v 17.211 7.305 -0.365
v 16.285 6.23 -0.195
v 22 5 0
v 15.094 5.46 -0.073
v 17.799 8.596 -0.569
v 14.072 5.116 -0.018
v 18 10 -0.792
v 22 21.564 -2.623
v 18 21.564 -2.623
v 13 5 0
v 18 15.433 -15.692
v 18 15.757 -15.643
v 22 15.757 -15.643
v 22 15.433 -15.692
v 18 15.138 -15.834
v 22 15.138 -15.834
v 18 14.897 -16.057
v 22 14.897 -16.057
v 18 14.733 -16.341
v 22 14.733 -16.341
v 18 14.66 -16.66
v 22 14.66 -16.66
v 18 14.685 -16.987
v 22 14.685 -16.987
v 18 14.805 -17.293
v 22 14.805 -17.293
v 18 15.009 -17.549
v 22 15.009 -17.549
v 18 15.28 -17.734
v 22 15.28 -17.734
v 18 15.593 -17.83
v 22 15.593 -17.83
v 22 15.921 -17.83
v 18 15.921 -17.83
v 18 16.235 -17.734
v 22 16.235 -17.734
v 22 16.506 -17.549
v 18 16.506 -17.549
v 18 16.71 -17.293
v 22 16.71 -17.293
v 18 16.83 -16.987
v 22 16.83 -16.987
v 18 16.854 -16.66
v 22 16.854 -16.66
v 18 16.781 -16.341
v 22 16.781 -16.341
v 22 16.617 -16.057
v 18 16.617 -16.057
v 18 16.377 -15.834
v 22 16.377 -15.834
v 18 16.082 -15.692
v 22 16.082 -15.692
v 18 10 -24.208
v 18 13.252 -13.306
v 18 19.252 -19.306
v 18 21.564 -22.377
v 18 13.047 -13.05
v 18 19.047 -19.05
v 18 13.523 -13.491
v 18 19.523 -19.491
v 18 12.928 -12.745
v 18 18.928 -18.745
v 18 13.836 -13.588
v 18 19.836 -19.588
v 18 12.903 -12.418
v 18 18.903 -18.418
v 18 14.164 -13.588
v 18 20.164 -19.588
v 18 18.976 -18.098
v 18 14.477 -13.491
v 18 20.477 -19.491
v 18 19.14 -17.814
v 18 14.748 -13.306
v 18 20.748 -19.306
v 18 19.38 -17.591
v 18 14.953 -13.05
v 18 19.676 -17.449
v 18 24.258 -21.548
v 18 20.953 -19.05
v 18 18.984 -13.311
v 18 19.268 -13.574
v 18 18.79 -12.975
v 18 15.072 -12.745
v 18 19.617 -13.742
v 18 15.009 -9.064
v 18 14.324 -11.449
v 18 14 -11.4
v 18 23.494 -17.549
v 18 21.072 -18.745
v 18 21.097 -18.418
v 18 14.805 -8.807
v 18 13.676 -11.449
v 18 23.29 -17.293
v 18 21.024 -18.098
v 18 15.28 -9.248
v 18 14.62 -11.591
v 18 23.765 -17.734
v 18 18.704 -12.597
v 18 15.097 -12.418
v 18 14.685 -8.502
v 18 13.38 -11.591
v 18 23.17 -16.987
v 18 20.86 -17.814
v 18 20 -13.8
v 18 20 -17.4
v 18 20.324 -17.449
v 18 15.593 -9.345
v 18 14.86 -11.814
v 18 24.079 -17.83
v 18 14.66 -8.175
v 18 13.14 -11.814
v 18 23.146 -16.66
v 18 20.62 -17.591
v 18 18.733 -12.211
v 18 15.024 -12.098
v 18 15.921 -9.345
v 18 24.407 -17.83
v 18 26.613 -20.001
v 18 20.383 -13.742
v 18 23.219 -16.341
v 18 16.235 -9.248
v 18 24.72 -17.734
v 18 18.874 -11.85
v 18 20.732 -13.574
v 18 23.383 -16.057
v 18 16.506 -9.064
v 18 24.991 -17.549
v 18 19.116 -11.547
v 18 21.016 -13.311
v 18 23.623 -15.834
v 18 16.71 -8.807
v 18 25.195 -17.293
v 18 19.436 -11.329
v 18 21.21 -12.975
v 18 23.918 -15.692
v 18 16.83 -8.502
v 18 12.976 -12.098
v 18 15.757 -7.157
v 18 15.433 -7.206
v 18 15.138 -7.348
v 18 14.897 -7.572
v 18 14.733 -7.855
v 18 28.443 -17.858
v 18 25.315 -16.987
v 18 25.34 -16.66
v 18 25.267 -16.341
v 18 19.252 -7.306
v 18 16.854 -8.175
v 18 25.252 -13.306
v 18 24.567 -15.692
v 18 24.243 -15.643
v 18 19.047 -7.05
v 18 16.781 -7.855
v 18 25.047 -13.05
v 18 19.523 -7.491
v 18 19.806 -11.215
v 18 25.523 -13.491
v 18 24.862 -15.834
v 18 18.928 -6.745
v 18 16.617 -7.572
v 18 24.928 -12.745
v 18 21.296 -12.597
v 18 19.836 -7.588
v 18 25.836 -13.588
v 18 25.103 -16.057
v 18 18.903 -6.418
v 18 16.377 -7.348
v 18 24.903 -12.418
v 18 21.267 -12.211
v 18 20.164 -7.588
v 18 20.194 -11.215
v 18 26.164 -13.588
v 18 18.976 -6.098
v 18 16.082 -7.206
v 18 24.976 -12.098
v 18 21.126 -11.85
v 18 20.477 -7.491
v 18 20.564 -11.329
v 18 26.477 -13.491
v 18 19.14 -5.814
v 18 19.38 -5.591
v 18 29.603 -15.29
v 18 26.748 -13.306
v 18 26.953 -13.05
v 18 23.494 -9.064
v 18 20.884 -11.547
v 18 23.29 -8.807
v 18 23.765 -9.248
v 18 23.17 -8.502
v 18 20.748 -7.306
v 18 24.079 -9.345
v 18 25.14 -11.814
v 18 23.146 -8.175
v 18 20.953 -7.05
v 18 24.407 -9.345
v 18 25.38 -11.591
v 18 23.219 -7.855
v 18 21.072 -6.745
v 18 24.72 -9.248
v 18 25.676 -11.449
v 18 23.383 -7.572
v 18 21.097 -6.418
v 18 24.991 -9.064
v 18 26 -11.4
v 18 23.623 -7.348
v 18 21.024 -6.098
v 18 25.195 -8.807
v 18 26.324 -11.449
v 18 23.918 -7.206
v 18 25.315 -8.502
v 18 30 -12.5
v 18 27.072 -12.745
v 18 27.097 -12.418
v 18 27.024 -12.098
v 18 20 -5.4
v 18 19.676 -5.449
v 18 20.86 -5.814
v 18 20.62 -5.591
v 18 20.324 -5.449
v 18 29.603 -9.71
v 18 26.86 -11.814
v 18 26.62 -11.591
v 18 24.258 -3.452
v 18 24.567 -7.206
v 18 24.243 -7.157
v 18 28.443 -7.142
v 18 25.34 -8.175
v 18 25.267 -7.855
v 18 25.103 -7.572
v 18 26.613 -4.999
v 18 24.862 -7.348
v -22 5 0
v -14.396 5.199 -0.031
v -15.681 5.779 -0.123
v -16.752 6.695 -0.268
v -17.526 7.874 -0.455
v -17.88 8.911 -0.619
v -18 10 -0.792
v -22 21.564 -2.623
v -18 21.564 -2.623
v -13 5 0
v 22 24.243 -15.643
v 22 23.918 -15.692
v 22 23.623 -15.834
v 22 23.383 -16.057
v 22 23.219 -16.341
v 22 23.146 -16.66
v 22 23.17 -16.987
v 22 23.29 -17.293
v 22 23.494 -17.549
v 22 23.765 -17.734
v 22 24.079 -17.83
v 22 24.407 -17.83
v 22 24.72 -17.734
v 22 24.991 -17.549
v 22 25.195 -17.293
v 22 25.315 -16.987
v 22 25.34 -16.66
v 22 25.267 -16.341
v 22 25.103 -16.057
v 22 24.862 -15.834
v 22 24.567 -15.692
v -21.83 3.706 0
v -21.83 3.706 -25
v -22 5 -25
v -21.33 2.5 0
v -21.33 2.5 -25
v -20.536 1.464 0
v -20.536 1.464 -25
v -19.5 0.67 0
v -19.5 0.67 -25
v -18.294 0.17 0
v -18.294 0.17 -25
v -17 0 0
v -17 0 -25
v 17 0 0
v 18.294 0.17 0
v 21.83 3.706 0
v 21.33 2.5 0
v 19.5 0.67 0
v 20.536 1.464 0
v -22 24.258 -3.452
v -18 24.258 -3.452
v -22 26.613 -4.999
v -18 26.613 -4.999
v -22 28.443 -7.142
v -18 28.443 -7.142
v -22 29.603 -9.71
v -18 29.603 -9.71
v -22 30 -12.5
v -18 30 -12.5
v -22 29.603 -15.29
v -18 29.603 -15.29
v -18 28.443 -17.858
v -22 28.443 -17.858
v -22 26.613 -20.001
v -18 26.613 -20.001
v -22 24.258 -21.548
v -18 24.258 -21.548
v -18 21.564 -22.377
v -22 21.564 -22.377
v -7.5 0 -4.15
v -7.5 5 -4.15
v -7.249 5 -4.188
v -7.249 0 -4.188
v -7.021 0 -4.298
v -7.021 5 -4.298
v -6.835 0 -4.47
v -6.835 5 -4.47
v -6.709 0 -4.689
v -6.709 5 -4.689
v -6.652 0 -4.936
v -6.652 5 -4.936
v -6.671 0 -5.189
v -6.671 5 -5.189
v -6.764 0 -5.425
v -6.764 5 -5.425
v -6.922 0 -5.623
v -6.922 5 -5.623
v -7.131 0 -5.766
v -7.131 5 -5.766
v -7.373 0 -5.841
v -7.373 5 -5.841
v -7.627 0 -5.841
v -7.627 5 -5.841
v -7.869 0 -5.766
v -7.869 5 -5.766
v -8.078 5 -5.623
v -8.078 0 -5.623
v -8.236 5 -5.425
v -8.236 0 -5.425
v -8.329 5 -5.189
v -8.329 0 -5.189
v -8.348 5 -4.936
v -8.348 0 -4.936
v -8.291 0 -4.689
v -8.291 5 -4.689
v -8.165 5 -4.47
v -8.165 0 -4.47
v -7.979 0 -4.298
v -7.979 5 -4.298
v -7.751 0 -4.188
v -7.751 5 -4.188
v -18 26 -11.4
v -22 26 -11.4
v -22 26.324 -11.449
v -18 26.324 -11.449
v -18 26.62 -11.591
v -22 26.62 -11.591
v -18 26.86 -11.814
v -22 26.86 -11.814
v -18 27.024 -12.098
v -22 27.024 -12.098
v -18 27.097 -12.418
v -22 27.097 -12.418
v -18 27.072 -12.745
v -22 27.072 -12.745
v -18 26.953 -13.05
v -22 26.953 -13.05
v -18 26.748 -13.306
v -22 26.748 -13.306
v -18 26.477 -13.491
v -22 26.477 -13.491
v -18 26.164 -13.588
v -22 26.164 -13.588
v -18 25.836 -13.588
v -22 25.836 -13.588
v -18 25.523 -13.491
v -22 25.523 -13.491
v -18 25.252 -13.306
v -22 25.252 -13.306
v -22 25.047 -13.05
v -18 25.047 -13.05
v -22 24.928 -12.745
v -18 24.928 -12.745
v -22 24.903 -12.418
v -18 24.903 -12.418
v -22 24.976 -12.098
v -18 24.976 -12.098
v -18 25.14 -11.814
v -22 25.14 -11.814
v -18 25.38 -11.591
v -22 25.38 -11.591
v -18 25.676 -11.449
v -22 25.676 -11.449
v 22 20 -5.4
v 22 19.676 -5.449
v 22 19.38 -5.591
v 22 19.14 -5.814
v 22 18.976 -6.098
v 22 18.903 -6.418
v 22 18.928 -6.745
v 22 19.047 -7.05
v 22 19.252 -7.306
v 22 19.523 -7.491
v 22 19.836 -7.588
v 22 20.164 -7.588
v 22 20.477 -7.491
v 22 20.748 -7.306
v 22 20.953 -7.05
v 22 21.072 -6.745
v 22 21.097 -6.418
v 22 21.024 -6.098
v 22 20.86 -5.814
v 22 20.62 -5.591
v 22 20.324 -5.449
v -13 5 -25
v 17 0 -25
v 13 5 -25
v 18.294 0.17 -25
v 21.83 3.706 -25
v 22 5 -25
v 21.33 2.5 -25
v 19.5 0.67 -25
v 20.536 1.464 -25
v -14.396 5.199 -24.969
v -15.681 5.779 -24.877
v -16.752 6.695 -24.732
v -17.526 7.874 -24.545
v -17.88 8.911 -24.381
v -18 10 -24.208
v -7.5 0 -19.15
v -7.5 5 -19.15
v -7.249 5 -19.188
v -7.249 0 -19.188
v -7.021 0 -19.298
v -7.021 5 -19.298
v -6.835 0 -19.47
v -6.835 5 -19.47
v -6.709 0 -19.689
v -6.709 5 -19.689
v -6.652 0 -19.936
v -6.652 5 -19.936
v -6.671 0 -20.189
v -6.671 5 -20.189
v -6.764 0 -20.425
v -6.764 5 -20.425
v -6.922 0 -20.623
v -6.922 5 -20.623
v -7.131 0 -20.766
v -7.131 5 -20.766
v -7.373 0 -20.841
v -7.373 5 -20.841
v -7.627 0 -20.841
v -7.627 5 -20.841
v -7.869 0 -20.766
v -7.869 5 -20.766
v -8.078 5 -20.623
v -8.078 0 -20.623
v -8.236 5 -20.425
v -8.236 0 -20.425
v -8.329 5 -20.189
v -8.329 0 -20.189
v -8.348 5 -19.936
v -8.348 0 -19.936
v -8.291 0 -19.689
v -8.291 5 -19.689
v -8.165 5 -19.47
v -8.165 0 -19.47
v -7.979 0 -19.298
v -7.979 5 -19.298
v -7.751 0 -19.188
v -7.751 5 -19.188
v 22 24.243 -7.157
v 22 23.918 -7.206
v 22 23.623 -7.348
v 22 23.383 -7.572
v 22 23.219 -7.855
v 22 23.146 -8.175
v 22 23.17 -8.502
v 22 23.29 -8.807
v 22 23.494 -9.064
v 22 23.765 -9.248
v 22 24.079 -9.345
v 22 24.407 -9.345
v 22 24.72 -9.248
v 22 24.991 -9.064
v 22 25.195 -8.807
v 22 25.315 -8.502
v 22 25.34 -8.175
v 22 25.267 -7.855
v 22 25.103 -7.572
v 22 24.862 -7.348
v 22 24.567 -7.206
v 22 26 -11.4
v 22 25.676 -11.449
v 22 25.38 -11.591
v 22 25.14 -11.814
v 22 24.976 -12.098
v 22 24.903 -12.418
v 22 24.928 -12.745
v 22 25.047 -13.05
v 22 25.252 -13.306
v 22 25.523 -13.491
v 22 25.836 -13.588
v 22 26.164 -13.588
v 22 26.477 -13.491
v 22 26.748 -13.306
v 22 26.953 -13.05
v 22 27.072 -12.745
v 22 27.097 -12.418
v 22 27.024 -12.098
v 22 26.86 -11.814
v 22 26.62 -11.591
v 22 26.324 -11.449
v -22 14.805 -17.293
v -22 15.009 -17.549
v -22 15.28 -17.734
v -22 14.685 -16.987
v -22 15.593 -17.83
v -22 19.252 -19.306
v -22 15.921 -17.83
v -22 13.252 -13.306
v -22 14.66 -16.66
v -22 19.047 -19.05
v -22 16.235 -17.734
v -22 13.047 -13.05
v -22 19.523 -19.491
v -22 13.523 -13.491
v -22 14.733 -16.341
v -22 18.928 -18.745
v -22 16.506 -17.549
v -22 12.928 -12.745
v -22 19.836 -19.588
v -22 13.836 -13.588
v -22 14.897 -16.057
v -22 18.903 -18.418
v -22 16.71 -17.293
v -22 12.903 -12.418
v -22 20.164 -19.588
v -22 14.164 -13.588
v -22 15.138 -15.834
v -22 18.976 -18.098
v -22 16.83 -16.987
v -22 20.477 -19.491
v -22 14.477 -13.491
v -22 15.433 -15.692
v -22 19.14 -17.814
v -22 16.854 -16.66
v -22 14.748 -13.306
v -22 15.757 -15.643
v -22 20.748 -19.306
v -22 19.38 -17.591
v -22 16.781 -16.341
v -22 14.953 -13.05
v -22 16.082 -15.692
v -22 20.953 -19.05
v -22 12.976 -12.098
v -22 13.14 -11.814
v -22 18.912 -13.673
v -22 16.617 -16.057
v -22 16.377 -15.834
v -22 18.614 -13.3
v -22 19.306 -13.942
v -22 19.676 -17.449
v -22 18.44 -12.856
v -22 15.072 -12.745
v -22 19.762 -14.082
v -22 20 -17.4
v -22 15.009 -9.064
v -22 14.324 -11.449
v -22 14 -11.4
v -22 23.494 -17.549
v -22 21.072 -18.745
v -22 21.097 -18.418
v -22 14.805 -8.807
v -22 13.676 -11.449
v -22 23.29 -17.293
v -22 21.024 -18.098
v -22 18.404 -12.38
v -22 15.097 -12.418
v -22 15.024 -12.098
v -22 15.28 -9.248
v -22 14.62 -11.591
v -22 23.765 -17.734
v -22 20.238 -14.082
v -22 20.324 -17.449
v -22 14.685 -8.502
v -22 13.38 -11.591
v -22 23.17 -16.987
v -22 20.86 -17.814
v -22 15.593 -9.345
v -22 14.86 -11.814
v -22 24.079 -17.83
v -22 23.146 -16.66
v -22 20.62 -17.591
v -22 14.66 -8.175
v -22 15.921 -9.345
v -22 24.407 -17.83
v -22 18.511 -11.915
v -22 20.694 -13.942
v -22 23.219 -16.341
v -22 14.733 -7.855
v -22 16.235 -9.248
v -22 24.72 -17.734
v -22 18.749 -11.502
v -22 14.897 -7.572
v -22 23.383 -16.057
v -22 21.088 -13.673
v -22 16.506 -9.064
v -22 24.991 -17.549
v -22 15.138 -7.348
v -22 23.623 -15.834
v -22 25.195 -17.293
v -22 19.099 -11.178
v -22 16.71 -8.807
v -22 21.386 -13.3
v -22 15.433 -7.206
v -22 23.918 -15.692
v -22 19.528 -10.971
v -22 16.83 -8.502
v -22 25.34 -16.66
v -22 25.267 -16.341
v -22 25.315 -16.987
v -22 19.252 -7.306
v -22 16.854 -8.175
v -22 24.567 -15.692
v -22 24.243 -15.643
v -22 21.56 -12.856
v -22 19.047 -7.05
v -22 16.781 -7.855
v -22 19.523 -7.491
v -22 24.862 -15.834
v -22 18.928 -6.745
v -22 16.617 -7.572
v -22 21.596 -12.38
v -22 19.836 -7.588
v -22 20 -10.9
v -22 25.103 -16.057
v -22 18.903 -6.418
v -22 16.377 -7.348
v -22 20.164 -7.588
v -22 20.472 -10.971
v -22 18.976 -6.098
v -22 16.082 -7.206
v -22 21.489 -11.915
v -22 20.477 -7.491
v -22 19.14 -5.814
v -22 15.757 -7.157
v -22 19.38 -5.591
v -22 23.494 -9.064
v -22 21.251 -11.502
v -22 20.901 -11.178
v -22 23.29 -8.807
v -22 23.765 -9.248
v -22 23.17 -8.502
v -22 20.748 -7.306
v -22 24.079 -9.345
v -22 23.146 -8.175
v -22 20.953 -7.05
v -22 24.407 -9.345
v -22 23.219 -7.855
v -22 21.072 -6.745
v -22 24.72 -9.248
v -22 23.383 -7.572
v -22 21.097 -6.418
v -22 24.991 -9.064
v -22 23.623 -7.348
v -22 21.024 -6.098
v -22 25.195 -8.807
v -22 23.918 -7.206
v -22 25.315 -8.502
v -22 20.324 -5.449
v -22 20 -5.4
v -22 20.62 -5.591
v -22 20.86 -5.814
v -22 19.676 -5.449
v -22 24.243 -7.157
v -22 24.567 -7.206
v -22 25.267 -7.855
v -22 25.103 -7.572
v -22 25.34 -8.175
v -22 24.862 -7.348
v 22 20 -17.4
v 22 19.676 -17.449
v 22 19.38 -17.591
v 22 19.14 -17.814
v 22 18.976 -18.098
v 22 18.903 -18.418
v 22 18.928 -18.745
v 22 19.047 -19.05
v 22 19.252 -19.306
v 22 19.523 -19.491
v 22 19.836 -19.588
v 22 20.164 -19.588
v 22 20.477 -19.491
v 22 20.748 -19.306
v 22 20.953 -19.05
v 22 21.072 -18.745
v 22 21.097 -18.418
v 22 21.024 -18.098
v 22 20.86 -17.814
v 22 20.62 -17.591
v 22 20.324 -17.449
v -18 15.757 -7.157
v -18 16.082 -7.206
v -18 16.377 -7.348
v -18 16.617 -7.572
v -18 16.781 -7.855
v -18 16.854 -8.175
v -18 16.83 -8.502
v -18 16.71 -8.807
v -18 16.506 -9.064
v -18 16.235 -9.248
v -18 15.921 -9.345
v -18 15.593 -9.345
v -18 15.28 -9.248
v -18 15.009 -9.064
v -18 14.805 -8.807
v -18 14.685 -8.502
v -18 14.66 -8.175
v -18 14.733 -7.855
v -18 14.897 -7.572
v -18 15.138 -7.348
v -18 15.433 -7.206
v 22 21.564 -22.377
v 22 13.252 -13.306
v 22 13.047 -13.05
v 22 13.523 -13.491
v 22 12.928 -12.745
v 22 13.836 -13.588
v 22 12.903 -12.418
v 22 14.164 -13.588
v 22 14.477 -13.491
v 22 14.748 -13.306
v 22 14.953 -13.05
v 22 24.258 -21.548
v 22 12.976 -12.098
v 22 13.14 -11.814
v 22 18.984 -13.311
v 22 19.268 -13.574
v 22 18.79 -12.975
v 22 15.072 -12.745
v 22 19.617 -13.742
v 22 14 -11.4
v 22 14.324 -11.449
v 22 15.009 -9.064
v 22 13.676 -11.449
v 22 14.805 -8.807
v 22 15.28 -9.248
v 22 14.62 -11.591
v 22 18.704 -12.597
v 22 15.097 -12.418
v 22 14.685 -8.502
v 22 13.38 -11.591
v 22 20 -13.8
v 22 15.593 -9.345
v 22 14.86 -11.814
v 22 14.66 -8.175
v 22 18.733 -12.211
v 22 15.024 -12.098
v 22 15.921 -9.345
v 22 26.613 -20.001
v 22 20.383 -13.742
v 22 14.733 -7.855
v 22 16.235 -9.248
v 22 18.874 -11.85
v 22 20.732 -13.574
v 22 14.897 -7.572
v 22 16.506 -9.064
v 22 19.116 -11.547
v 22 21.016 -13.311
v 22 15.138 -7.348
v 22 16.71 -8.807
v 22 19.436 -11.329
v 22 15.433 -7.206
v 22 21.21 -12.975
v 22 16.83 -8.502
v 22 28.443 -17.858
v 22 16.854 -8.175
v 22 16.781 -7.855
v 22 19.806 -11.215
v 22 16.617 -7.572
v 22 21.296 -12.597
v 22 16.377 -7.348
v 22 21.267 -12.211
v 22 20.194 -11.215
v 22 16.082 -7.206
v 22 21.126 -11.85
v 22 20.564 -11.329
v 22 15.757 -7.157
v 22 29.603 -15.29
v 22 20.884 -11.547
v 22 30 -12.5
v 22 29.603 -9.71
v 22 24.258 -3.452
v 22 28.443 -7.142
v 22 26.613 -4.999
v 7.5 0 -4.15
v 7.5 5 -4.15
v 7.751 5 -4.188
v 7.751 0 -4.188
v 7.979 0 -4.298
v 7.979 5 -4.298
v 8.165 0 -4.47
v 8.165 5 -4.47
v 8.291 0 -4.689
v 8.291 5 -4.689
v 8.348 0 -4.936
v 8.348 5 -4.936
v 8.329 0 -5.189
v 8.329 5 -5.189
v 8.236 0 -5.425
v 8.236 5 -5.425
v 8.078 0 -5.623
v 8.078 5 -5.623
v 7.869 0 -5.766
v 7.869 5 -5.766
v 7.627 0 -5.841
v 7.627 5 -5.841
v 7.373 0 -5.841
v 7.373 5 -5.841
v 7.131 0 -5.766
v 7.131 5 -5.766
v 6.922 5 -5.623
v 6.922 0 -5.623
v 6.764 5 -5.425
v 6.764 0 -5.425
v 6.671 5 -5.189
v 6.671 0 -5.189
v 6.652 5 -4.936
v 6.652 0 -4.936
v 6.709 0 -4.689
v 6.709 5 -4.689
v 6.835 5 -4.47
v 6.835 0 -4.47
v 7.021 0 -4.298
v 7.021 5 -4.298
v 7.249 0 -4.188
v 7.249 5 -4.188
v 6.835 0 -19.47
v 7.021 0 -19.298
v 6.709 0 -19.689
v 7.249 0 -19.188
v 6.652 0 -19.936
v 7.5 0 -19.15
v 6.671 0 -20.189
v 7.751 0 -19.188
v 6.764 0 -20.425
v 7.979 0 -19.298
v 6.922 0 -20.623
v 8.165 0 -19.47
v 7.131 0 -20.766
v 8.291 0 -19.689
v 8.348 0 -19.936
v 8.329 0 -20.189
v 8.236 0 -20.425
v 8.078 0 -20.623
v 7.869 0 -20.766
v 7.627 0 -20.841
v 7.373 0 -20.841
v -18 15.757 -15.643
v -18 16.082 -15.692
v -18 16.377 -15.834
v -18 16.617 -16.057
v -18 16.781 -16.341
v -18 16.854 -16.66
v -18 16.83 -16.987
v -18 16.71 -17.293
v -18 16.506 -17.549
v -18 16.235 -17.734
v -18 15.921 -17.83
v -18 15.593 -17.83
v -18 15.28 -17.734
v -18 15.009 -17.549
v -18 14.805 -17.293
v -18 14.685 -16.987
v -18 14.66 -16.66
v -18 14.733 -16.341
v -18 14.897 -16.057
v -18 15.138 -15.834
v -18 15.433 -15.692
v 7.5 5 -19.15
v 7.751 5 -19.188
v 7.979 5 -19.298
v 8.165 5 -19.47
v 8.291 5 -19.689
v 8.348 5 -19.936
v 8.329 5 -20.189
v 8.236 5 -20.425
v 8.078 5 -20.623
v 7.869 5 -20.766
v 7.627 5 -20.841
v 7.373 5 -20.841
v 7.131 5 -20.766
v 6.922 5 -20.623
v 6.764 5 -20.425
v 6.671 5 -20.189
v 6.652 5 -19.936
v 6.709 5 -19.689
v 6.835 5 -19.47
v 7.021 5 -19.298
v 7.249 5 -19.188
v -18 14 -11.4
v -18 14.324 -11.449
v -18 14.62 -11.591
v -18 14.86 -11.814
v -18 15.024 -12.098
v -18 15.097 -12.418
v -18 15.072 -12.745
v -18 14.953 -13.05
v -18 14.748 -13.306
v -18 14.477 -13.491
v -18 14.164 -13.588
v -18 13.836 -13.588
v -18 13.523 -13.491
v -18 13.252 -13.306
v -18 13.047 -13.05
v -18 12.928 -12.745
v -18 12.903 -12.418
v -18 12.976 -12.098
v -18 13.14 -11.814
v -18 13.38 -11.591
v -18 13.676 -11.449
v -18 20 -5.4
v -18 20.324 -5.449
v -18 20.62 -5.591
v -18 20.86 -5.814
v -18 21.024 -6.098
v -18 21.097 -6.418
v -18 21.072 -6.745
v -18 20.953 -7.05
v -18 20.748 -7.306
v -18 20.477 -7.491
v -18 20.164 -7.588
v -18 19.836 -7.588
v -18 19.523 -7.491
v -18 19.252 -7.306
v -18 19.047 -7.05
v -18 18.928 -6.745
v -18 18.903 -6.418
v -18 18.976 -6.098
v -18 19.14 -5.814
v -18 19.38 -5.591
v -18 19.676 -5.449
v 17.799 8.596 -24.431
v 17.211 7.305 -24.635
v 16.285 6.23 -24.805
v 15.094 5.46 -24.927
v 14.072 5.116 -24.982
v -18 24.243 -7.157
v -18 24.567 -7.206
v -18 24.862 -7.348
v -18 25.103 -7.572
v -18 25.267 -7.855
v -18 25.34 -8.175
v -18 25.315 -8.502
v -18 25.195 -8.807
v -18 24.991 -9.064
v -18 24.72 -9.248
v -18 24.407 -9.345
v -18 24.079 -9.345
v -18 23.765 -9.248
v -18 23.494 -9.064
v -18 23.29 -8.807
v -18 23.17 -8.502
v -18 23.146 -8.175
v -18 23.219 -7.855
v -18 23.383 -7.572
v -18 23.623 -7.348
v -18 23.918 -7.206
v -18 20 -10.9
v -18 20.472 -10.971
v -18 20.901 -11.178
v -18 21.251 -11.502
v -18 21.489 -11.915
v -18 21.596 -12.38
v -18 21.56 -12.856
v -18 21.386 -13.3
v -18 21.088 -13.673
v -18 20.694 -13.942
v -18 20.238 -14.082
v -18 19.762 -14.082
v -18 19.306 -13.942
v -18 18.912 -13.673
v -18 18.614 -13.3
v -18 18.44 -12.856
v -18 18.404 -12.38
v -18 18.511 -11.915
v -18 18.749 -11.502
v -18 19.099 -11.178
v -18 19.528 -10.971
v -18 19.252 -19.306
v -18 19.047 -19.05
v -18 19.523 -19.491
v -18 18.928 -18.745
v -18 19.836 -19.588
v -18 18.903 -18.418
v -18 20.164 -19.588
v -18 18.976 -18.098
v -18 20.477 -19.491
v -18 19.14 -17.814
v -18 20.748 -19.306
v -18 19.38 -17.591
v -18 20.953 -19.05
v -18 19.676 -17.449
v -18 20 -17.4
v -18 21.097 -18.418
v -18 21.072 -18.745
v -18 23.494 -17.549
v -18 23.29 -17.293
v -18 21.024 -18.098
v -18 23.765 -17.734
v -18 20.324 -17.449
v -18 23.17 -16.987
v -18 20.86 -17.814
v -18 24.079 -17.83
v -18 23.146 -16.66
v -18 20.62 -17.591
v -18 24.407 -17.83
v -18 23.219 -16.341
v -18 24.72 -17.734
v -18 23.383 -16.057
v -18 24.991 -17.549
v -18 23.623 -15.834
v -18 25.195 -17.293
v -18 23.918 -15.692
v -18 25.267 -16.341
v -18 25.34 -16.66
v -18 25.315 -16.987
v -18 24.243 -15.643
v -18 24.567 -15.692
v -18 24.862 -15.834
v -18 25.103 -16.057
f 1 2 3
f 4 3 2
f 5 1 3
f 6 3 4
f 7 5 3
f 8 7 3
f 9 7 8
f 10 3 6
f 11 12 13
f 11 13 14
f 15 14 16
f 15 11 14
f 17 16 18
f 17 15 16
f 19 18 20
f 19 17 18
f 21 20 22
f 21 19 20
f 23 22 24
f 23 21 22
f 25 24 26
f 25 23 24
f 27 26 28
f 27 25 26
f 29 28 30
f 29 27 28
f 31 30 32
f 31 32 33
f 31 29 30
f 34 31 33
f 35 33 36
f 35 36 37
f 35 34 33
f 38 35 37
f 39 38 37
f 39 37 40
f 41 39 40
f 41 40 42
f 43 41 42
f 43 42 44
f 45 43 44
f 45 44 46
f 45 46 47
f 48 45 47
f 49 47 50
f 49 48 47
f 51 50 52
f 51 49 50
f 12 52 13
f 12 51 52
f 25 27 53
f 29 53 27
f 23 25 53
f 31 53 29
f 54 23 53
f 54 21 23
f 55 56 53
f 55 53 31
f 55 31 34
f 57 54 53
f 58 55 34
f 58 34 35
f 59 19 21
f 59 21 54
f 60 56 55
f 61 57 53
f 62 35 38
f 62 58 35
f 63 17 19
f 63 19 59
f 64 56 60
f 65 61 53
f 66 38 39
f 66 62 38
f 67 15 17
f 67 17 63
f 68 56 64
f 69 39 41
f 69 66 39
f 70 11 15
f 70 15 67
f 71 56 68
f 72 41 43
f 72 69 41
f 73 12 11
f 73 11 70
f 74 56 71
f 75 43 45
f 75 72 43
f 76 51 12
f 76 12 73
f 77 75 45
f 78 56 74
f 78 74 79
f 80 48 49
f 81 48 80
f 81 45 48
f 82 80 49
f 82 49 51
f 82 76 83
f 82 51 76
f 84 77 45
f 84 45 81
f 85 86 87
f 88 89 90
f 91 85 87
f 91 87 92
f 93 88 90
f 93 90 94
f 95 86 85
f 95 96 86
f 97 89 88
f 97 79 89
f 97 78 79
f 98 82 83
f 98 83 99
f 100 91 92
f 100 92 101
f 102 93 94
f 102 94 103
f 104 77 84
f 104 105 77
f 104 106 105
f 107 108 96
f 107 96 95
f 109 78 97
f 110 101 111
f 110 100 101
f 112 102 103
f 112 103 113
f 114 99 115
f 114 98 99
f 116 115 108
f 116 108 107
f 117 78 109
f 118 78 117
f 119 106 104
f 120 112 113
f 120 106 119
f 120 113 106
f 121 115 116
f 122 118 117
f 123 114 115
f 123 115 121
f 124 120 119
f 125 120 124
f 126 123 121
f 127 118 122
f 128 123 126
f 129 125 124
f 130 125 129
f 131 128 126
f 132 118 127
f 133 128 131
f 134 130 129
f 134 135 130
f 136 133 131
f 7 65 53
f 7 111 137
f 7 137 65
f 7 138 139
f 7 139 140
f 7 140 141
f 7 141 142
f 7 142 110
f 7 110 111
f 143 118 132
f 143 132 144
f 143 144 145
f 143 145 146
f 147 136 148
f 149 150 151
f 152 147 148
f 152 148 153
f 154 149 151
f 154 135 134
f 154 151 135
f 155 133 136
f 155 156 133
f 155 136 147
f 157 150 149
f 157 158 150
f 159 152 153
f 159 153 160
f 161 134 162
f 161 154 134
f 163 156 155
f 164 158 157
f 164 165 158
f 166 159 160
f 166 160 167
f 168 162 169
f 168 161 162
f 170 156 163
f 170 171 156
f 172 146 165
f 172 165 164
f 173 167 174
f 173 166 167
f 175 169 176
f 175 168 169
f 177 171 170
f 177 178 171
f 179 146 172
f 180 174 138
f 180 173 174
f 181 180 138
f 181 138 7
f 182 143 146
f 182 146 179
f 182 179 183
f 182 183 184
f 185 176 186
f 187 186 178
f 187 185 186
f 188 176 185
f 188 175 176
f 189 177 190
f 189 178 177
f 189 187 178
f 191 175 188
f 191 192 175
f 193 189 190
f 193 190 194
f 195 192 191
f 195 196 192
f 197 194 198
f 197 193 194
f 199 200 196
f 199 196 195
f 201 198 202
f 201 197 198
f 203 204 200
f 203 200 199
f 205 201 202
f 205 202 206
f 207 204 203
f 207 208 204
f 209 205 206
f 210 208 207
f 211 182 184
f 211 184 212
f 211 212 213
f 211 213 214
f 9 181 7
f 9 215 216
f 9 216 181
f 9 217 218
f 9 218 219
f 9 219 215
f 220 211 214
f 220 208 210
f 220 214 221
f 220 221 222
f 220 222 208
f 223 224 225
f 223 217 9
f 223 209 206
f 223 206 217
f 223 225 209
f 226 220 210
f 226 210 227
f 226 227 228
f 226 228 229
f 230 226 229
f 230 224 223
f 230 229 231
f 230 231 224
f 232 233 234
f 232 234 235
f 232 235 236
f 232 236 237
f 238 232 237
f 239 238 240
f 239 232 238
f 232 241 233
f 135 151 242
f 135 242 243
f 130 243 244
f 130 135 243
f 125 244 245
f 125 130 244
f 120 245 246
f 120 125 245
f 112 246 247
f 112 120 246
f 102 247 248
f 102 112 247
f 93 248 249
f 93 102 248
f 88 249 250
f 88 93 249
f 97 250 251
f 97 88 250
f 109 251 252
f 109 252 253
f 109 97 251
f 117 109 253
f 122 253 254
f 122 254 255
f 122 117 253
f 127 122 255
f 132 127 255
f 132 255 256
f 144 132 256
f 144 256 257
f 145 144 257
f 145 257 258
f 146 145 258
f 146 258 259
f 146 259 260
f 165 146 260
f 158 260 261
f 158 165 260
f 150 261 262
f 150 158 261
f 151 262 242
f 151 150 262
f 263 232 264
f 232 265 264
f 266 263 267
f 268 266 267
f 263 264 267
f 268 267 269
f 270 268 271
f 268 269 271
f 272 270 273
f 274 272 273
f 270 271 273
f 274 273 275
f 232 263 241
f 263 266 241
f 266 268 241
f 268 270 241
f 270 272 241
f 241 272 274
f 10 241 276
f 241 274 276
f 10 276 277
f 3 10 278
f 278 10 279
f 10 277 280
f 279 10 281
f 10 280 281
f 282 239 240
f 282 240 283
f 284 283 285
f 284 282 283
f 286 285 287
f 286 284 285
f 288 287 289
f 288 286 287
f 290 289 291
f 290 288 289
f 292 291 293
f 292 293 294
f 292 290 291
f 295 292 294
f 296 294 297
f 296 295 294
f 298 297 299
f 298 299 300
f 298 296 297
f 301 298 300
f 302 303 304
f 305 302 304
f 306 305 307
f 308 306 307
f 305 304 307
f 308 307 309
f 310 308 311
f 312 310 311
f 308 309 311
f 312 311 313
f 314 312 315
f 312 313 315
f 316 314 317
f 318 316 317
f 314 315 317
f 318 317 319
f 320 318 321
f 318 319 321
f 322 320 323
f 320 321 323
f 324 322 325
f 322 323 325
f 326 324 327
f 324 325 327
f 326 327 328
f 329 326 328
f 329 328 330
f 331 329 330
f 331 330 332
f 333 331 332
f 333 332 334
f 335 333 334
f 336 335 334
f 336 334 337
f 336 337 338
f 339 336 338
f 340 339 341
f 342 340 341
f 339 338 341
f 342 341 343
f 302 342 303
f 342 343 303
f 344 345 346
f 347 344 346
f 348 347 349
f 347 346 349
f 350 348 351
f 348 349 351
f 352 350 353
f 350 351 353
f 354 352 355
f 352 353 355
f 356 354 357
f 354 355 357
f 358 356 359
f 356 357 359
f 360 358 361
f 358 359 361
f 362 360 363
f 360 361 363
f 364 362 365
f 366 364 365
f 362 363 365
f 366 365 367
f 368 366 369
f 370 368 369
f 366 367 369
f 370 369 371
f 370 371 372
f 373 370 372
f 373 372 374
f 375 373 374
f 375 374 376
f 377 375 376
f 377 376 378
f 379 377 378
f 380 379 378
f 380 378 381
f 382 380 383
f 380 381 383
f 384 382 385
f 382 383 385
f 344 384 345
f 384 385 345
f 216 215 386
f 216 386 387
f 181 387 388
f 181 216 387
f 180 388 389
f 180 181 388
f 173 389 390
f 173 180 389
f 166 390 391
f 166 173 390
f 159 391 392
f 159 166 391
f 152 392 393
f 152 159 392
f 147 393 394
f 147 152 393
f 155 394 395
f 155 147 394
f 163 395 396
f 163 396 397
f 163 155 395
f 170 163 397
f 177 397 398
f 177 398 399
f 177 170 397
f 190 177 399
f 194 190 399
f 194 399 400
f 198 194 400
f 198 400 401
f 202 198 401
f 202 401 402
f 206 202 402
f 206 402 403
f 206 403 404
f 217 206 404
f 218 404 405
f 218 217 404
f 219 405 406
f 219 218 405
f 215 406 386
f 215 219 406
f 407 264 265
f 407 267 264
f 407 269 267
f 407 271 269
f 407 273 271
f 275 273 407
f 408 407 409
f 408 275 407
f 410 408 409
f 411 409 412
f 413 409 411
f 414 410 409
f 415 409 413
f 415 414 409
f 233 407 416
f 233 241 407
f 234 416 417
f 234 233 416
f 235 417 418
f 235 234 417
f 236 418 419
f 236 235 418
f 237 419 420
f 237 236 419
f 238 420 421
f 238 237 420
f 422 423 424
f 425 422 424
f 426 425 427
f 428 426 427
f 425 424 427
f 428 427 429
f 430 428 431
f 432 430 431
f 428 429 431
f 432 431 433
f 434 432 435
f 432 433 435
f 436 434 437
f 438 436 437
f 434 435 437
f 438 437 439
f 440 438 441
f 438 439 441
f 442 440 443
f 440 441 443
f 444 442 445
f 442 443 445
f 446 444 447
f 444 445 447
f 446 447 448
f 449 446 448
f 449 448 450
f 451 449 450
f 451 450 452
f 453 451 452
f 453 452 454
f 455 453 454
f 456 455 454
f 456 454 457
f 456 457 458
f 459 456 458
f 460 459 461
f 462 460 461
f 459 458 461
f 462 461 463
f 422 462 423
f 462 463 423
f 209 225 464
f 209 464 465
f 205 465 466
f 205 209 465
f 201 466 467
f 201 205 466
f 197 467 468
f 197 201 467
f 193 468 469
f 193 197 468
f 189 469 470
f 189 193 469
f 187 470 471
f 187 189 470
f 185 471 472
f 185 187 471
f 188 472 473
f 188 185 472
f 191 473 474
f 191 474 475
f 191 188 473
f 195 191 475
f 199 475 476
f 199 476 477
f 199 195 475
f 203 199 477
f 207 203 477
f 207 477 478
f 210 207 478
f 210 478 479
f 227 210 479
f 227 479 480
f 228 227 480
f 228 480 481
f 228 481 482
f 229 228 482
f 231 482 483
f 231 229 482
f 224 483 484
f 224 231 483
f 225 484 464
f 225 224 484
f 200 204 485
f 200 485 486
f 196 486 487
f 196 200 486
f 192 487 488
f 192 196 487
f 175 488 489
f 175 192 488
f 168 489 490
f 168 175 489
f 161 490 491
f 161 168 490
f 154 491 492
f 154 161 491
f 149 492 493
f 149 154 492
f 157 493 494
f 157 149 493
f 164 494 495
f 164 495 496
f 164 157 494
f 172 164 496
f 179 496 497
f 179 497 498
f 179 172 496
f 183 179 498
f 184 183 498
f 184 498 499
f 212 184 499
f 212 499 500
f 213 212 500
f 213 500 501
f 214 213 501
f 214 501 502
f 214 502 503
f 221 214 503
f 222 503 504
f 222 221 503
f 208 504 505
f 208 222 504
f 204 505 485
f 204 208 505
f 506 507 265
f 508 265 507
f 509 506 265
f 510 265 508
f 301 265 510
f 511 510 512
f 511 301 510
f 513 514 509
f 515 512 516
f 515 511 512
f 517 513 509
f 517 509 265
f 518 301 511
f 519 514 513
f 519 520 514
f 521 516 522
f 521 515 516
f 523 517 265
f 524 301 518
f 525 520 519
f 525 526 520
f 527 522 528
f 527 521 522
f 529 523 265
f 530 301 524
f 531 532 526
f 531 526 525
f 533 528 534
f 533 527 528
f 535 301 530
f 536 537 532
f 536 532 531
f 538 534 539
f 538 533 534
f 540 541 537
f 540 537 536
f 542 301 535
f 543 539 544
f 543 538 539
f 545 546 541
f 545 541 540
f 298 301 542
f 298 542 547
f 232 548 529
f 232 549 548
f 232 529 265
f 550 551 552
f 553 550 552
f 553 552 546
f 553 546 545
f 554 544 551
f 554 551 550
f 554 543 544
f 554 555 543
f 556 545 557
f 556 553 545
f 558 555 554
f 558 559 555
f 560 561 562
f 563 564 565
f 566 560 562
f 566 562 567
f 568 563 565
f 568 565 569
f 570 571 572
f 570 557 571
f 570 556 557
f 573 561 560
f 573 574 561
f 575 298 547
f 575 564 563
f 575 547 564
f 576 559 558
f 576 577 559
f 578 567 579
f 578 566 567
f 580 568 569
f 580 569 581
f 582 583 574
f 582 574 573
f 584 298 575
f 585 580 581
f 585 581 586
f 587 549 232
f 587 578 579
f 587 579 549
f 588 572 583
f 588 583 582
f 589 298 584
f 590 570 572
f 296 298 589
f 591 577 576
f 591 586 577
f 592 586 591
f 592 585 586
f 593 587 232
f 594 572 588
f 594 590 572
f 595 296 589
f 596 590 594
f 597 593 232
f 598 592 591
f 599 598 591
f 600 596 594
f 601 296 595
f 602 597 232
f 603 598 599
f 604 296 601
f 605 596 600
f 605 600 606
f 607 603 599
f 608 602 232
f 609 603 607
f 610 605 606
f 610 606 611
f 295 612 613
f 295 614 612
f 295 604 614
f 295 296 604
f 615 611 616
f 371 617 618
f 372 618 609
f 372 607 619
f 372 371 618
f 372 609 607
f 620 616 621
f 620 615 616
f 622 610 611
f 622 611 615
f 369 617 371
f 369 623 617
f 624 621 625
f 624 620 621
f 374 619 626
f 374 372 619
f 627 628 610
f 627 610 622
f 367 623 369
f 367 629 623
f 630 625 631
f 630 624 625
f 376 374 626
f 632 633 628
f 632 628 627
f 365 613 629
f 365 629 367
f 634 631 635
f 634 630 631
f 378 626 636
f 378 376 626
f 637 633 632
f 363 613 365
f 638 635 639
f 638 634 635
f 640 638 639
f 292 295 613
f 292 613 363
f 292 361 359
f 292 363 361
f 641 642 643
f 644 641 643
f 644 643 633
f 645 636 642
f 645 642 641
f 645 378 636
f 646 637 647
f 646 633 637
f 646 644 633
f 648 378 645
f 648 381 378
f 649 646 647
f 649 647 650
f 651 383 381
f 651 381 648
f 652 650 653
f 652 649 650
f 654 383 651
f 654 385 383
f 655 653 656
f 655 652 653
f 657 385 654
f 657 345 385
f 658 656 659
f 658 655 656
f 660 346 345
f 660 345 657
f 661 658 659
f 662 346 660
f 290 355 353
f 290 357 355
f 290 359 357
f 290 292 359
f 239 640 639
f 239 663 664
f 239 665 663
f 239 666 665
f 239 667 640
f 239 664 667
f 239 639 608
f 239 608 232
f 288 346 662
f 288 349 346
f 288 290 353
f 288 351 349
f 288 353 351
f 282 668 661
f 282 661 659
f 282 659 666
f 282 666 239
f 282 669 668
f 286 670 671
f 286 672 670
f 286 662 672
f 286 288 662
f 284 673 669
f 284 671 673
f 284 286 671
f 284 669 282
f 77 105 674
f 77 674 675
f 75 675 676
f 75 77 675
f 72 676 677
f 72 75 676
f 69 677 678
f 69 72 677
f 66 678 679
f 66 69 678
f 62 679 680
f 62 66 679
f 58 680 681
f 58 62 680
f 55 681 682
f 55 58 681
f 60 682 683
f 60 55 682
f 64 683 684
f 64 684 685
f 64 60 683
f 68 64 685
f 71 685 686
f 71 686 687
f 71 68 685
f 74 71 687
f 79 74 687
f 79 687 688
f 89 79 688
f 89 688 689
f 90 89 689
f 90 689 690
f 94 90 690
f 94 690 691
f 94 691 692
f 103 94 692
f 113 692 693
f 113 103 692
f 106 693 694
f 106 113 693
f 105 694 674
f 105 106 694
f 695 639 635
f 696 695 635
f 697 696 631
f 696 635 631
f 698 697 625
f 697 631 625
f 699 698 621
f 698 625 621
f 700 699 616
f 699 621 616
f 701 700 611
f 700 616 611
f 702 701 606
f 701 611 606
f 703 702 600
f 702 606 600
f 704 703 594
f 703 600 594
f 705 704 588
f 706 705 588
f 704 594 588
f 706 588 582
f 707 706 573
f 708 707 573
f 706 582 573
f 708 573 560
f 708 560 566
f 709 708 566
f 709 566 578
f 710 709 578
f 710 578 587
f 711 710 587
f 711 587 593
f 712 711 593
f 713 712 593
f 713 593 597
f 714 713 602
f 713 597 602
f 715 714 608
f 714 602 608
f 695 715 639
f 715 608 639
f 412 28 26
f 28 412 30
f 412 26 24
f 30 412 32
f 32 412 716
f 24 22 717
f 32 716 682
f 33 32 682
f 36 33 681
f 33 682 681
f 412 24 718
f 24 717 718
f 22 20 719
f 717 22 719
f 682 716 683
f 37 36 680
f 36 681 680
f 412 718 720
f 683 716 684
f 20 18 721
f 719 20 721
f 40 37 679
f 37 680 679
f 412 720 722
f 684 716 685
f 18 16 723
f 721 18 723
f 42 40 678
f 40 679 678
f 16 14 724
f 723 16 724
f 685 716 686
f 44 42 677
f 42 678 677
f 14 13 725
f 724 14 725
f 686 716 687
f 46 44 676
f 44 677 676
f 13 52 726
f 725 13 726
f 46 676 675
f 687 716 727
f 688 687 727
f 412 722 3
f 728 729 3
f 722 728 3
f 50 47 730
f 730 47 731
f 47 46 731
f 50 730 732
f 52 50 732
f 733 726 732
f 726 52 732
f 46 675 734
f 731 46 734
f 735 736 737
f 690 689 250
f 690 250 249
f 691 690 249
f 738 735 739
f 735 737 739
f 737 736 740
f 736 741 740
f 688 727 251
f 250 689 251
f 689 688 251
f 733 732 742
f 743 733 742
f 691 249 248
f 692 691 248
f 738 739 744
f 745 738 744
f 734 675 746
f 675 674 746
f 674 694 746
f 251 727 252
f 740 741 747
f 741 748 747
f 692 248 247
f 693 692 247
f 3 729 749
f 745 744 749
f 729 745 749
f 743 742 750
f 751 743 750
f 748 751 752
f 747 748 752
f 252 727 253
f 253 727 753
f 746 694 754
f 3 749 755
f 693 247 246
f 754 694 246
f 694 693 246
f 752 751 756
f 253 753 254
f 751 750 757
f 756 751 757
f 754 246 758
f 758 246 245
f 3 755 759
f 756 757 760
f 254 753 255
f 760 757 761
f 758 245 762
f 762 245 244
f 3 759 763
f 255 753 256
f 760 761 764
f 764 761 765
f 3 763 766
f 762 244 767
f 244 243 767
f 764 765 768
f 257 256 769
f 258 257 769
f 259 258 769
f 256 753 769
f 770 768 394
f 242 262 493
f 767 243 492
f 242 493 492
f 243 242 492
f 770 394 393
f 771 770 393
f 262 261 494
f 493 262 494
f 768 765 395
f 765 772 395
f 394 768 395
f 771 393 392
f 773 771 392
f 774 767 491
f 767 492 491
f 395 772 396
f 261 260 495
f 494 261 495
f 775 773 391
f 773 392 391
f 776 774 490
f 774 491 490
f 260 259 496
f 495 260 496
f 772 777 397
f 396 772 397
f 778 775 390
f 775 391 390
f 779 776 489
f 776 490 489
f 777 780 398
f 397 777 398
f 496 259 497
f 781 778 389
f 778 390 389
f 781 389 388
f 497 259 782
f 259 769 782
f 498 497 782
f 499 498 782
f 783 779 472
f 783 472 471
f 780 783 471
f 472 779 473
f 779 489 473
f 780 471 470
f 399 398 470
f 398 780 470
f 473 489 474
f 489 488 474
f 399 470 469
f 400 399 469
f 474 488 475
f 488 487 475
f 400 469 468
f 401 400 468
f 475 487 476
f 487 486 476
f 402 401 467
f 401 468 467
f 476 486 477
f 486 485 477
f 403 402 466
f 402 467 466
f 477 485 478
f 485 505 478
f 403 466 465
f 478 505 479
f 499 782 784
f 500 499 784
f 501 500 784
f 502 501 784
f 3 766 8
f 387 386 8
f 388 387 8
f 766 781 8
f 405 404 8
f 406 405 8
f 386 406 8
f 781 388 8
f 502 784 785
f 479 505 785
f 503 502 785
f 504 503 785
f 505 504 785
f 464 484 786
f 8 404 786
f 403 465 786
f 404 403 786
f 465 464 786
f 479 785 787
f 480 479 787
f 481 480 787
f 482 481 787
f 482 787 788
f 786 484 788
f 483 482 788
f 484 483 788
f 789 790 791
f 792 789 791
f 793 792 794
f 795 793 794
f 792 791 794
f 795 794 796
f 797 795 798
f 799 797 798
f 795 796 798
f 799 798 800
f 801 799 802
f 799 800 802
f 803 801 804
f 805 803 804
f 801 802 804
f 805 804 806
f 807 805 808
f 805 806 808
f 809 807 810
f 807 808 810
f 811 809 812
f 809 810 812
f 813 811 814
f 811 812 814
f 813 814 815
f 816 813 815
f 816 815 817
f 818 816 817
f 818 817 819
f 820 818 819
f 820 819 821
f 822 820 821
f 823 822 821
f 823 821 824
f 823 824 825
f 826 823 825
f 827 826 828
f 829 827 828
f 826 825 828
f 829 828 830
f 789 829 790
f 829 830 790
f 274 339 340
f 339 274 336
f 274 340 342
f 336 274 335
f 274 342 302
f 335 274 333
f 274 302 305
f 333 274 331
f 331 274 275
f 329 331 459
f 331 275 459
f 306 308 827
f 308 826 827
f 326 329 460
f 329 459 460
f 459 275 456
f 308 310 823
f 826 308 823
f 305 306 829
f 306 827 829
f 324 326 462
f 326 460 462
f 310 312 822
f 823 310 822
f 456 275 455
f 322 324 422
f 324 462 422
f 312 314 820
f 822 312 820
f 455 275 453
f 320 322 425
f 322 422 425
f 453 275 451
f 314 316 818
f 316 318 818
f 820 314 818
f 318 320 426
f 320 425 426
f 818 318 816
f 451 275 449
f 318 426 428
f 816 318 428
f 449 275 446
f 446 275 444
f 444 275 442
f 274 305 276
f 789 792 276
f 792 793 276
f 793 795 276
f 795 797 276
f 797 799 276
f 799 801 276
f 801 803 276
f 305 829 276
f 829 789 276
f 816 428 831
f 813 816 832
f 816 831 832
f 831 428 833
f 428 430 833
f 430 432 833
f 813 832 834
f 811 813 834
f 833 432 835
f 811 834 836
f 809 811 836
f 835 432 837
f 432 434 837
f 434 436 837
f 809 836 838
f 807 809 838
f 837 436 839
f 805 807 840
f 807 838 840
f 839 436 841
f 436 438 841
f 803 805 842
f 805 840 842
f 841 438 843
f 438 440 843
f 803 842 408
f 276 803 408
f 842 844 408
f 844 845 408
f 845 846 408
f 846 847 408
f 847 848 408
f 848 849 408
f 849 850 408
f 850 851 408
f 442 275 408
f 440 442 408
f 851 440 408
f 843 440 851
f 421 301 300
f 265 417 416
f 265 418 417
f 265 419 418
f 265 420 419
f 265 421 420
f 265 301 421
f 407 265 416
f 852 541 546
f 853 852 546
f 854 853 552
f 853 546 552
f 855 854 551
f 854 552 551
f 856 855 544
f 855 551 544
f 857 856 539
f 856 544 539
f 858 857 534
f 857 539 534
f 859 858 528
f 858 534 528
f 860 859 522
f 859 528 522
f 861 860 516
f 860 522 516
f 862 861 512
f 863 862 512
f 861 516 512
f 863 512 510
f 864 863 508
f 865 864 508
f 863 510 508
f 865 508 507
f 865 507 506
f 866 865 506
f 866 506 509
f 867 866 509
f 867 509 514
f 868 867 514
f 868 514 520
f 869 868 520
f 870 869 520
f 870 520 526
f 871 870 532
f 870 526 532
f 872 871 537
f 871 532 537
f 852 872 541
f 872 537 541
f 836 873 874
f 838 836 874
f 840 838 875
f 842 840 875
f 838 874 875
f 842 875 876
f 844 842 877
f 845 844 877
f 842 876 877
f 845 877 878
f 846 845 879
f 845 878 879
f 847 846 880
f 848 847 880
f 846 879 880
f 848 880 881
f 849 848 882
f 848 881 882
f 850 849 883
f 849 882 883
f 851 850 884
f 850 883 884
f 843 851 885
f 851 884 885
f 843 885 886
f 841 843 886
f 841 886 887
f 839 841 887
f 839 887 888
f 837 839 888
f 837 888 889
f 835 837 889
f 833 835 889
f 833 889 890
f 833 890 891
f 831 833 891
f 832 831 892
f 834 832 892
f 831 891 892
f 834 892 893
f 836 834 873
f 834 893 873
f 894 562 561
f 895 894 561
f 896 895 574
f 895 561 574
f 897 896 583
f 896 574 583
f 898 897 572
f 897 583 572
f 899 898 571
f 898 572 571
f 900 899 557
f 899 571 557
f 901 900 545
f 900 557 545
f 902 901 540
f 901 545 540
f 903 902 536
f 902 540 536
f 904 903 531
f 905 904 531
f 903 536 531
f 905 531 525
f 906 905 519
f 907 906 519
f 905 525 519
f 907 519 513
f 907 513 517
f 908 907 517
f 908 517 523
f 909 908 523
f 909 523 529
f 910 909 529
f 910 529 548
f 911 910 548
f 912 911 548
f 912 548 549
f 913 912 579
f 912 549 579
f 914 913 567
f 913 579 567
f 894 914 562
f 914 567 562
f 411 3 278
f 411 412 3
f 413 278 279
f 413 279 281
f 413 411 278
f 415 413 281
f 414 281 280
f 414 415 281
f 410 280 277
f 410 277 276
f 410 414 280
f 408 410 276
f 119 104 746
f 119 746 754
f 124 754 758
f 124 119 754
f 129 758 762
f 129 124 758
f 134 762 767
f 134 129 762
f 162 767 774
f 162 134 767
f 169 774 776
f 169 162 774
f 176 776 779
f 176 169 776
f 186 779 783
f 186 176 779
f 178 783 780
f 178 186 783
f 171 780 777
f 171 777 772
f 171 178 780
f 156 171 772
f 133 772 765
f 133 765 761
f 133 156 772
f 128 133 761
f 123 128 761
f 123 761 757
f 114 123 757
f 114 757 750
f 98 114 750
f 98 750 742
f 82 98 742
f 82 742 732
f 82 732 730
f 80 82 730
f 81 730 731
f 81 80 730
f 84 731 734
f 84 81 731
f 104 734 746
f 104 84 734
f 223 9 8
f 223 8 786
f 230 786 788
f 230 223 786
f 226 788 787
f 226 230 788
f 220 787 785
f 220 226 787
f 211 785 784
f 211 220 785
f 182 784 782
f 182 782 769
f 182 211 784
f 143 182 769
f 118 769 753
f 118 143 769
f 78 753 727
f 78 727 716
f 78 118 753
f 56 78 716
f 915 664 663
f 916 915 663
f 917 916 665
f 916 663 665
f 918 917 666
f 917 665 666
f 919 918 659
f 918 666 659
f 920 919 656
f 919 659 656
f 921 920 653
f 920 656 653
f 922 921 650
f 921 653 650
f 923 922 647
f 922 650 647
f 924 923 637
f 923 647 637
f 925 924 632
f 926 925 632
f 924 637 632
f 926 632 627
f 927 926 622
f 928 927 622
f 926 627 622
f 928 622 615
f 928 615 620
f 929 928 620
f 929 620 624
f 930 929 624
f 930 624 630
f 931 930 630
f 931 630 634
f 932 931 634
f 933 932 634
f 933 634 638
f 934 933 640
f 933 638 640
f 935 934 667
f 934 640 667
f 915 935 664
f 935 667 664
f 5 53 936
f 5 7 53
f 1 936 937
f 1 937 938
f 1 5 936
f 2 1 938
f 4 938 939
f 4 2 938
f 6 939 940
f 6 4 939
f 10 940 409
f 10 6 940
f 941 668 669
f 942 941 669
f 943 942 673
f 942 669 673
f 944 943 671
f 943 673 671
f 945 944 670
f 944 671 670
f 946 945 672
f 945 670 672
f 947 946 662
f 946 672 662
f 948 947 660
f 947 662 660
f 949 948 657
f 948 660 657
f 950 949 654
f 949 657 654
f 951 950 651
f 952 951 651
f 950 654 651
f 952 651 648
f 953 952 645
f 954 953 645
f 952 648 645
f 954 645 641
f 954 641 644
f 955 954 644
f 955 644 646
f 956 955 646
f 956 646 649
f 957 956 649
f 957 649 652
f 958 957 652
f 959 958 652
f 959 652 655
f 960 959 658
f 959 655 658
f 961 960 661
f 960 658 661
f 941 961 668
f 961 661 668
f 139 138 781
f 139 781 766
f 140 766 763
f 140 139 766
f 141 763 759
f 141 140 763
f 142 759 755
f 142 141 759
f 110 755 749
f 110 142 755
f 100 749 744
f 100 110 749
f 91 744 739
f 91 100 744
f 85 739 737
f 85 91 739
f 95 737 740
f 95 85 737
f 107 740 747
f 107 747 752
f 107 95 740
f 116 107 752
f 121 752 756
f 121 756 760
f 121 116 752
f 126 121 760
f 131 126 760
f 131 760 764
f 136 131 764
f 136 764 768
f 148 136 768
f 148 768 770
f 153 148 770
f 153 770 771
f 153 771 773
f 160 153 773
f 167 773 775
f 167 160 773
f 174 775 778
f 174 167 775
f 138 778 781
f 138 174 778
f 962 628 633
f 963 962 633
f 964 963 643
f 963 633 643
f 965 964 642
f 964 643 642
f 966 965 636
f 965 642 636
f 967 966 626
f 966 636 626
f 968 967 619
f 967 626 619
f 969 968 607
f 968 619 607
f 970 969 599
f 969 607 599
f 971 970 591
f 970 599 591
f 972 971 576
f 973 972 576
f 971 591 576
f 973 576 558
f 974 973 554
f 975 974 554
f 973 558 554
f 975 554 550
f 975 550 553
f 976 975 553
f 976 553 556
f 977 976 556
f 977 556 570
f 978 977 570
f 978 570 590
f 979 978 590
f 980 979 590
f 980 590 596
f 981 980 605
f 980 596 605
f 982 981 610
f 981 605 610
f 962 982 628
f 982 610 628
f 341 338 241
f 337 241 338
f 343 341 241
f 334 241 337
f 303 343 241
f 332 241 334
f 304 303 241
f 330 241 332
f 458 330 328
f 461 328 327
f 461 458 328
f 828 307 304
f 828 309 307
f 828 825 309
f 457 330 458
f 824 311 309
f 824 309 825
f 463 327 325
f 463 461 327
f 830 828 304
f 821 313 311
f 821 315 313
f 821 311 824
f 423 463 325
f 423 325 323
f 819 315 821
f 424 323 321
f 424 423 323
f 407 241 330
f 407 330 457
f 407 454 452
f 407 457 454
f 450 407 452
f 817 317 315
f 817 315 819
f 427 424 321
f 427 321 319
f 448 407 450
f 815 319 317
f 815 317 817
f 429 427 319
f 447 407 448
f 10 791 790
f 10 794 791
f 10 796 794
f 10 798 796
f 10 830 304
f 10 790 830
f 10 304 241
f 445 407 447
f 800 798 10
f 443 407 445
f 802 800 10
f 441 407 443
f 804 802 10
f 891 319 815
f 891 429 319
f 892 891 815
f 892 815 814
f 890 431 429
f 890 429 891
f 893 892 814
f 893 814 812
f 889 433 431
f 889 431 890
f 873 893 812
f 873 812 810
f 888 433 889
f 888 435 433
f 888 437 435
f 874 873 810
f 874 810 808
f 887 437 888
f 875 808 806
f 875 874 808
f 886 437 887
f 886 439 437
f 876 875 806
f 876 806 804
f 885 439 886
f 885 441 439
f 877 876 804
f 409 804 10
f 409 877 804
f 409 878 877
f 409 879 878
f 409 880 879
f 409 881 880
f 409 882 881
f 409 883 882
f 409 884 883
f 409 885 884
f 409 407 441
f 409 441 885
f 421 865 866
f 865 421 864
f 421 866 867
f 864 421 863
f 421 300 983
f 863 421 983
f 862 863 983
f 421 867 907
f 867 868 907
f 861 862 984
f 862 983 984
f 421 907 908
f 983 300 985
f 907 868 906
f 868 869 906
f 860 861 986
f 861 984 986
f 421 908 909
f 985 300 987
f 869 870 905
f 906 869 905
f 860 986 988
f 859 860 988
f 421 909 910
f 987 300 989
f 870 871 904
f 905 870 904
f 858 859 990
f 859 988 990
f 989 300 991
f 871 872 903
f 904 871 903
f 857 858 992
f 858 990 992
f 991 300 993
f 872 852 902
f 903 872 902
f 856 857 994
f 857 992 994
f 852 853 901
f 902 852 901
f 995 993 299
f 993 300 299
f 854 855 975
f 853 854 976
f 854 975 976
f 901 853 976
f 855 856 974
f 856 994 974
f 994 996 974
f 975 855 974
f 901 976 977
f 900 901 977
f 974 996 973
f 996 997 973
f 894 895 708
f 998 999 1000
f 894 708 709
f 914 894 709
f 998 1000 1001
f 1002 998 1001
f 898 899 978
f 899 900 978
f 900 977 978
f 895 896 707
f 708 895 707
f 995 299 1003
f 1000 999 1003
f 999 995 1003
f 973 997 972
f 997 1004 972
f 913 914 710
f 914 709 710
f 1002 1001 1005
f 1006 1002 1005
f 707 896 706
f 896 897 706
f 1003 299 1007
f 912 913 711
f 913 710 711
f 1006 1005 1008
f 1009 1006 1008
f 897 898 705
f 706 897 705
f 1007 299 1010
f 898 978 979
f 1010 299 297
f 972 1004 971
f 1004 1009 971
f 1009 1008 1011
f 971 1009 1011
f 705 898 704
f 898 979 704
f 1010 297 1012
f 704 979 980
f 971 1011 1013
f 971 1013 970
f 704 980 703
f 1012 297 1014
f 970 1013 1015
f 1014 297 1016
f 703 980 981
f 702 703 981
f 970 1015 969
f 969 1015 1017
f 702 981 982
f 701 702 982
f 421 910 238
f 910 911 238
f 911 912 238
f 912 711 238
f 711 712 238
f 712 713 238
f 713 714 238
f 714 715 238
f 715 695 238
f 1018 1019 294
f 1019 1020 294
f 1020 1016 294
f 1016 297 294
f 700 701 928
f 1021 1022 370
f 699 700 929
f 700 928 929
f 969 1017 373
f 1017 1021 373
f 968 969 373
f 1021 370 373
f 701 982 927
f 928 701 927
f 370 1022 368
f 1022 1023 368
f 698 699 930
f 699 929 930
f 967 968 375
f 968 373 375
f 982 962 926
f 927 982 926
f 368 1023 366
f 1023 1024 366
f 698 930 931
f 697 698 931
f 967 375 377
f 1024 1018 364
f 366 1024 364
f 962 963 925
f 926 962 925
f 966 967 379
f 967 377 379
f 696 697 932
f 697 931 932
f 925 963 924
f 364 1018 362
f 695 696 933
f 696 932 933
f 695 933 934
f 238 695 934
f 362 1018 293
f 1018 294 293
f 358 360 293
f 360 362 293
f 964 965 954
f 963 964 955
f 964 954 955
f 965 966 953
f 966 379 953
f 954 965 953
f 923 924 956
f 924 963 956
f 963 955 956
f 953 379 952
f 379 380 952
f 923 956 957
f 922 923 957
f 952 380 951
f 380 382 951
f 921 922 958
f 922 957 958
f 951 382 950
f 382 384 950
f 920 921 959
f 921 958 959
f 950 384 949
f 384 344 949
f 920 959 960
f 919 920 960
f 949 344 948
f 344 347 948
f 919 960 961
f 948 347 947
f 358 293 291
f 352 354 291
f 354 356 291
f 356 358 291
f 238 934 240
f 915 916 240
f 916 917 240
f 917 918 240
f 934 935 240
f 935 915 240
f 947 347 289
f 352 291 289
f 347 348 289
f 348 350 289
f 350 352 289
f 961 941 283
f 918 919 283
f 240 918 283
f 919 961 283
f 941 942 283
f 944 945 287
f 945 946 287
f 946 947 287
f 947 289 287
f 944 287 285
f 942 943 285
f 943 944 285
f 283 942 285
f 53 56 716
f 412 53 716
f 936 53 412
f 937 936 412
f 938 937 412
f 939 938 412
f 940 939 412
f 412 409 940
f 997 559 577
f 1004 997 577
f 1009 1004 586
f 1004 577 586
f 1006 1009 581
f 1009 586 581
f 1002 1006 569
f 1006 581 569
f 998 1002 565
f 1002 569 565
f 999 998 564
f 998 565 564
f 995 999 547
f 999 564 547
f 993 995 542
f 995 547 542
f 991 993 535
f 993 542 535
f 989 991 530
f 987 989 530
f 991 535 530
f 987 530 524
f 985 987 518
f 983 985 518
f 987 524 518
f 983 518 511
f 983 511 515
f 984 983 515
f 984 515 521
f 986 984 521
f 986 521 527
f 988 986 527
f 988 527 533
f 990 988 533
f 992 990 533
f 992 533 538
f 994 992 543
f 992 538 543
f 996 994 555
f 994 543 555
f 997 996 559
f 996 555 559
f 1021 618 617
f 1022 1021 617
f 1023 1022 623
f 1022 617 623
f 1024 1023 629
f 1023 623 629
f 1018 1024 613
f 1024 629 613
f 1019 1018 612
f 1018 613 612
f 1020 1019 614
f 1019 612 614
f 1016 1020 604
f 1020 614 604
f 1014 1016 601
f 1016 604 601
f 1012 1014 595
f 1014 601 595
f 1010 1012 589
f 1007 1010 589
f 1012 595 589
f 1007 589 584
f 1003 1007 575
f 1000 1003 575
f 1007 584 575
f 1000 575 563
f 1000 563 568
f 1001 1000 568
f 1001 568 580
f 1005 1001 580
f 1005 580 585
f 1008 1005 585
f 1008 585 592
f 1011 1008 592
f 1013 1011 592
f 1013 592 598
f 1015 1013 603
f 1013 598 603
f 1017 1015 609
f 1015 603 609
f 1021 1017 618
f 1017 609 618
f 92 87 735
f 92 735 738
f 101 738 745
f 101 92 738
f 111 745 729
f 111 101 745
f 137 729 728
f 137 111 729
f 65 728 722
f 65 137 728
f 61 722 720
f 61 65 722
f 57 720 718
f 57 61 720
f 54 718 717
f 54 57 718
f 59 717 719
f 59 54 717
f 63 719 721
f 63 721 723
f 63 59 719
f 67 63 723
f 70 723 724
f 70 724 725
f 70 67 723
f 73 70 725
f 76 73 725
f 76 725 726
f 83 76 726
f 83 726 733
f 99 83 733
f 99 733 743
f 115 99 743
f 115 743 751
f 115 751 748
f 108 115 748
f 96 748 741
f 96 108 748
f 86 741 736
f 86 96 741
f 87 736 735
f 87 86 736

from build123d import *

# Parameters (mm, degrees)
SKETCH_1_W          = 44
SKETCH_1_H          = 25
EXTRUDE_1_DEPTH     = 5
SKETCH_2_R          = 1.1
SKETCH_2_R_2        = 1.6
EXTRUDE_2_DEPTH     = 4
EXTRUDE_START       = -4
SKETCH_3_R          = 1.3
SKETCH_3_R_2        = 1.1
EXTRUDE_3_DEPTH     = 4
FILLET_1_R          = 5
SKETCH_4_R          = 0.85
CUT_EXTRUDE_1_DEPTH = 5


with BuildPart() as part:
    # Sketch 1 → Extrude 1 (new body)
    with BuildSketch(Plane(origin=(0, 0, 0), x_dir=(1, 0, 0), z_dir=(0, 1, 0))):
        with Locations((0, 12.5)):
            Rectangle(SKETCH_1_W, SKETCH_1_H)
    extrude(amount=EXTRUDE_1_DEPTH)

    # Sketch 2 → Extrude 2 (add)
    with BuildSketch(Plane.ZY.offset(22)):
        with BuildLine():
            Line((-25, 5), (0, 5))
            Line((0, 5), (-2.623078099, 21.564101584))
            ThreePointArc((-2.623078099, 21.564101584), (-12.5, 30), (-22.376921901, 21.564101584))
            Line((-22.376921901, 21.564101584), (-25, 5))
        make_face()
        with Locations((-12.5, 26)):
            Circle(SKETCH_2_R, mode=Mode.SUBTRACT)
        with Locations((-8.257359313, 24.242640687)):
            Circle(SKETCH_2_R, mode=Mode.SUBTRACT)
        with Locations((-6.5, 20)):
            Circle(SKETCH_2_R, mode=Mode.SUBTRACT)
        with Locations((-8.257359313, 15.757359313)):
            Circle(SKETCH_2_R, mode=Mode.SUBTRACT)
        with Locations((-12.5, 14)):
            Circle(SKETCH_2_R, mode=Mode.SUBTRACT)
        with Locations((-16.742640687, 15.757359313)):
            Circle(SKETCH_2_R, mode=Mode.SUBTRACT)
        with Locations((-18.5, 20)):
            Circle(SKETCH_2_R, mode=Mode.SUBTRACT)
        with Locations((-16.742640687, 24.242640687)):
            Circle(SKETCH_2_R, mode=Mode.SUBTRACT)
        with Locations((-12.5, 20)):
            Circle(SKETCH_2_R_2, mode=Mode.SUBTRACT)
    extrude(amount=-EXTRUDE_2_DEPTH)

    # Sketch 3 → Extrude 3 (add)
    with BuildSketch(Plane(origin=(22, 0, 0), x_dir=(0, 0, -1), z_dir=(1, 0, 0)).offset(EXTRUDE_START)):
        with BuildLine():
            Line((0, 5), (2.623078099, 21.564101584))
            ThreePointArc((2.623078099, 21.564101584), (12.5, 30), (22.376921901, 21.564101584))
            Line((22.376921901, 21.564101584), (25, 5))
            Line((25, 5), (0, 5))
        make_face()
        with Locations((12.5, 20)):
            Circle(SKETCH_3_R, mode=Mode.SUBTRACT)
        with Locations(Location((8.257359313, 15.757359313, 0), (0, 0, 180))):
            Circle(SKETCH_3_R_2, mode=Mode.SUBTRACT)
        with Locations(Location((12.5, 14, 0), (0, 0, 180))):
            Circle(SKETCH_3_R_2, mode=Mode.SUBTRACT)
        with Locations(Location((16.742640687, 15.757359313, 0), (0, 0, 180))):
            Circle(SKETCH_3_R_2, mode=Mode.SUBTRACT)
        with Locations(Location((18.5, 20, 0), (0, 0, 180))):
            Circle(SKETCH_3_R_2, mode=Mode.SUBTRACT)
        with Locations(Location((16.742640687, 24.242640687, 0), (0, 0, 180))):
            Circle(SKETCH_3_R_2, mode=Mode.SUBTRACT)
        with Locations(Location((12.5, 26, 0), (0, 0, 180))):
            Circle(SKETCH_3_R_2, mode=Mode.SUBTRACT)
        with Locations(Location((8.257359313, 24.242640687, 0), (0, 0, 180))):
            Circle(SKETCH_3_R_2, mode=Mode.SUBTRACT)
        with Locations(Location((6.5, 20, 0), (0, 0, 180))):
            Circle(SKETCH_3_R_2, mode=Mode.SUBTRACT)
    extrude(amount=EXTRUDE_3_DEPTH)

    # Fillet 1
    fillet_1_edges = [part.edges().sort_by_distance(p)[0] for p in [
        (18, 5, -12.5),
        (-18, 5, -12.5),
        (22, 0, -12.5),
        (-22, 0, -12.5),
    ]]
    fillet(fillet_1_edges, radius=FILLET_1_R)

    # Sketch 4 → Cut-Extrude 1 (cut)
    with BuildSketch(Plane(origin=(0, 5, 0), x_dir=(1, 0, 0), z_dir=(0, 1, 0))):
        with Locations(Location((-7.5, 20, 0), (0, 0, 270))):
            Circle(SKETCH_4_R)
        with Locations(Location((7.5, 20, 0), (0, 0, 270))):
            Circle(SKETCH_4_R)
        with Locations(Location((7.5, 5, 0), (0, 0, 270))):
            Circle(SKETCH_4_R)
        with Locations(Location((-7.5, 5, 0), (0, 0, 270))):
            Circle(SKETCH_4_R)
    extrude(amount=-CUT_EXTRUDE_1_DEPTH, mode=Mode.SUBTRACT)


solid = part.part
